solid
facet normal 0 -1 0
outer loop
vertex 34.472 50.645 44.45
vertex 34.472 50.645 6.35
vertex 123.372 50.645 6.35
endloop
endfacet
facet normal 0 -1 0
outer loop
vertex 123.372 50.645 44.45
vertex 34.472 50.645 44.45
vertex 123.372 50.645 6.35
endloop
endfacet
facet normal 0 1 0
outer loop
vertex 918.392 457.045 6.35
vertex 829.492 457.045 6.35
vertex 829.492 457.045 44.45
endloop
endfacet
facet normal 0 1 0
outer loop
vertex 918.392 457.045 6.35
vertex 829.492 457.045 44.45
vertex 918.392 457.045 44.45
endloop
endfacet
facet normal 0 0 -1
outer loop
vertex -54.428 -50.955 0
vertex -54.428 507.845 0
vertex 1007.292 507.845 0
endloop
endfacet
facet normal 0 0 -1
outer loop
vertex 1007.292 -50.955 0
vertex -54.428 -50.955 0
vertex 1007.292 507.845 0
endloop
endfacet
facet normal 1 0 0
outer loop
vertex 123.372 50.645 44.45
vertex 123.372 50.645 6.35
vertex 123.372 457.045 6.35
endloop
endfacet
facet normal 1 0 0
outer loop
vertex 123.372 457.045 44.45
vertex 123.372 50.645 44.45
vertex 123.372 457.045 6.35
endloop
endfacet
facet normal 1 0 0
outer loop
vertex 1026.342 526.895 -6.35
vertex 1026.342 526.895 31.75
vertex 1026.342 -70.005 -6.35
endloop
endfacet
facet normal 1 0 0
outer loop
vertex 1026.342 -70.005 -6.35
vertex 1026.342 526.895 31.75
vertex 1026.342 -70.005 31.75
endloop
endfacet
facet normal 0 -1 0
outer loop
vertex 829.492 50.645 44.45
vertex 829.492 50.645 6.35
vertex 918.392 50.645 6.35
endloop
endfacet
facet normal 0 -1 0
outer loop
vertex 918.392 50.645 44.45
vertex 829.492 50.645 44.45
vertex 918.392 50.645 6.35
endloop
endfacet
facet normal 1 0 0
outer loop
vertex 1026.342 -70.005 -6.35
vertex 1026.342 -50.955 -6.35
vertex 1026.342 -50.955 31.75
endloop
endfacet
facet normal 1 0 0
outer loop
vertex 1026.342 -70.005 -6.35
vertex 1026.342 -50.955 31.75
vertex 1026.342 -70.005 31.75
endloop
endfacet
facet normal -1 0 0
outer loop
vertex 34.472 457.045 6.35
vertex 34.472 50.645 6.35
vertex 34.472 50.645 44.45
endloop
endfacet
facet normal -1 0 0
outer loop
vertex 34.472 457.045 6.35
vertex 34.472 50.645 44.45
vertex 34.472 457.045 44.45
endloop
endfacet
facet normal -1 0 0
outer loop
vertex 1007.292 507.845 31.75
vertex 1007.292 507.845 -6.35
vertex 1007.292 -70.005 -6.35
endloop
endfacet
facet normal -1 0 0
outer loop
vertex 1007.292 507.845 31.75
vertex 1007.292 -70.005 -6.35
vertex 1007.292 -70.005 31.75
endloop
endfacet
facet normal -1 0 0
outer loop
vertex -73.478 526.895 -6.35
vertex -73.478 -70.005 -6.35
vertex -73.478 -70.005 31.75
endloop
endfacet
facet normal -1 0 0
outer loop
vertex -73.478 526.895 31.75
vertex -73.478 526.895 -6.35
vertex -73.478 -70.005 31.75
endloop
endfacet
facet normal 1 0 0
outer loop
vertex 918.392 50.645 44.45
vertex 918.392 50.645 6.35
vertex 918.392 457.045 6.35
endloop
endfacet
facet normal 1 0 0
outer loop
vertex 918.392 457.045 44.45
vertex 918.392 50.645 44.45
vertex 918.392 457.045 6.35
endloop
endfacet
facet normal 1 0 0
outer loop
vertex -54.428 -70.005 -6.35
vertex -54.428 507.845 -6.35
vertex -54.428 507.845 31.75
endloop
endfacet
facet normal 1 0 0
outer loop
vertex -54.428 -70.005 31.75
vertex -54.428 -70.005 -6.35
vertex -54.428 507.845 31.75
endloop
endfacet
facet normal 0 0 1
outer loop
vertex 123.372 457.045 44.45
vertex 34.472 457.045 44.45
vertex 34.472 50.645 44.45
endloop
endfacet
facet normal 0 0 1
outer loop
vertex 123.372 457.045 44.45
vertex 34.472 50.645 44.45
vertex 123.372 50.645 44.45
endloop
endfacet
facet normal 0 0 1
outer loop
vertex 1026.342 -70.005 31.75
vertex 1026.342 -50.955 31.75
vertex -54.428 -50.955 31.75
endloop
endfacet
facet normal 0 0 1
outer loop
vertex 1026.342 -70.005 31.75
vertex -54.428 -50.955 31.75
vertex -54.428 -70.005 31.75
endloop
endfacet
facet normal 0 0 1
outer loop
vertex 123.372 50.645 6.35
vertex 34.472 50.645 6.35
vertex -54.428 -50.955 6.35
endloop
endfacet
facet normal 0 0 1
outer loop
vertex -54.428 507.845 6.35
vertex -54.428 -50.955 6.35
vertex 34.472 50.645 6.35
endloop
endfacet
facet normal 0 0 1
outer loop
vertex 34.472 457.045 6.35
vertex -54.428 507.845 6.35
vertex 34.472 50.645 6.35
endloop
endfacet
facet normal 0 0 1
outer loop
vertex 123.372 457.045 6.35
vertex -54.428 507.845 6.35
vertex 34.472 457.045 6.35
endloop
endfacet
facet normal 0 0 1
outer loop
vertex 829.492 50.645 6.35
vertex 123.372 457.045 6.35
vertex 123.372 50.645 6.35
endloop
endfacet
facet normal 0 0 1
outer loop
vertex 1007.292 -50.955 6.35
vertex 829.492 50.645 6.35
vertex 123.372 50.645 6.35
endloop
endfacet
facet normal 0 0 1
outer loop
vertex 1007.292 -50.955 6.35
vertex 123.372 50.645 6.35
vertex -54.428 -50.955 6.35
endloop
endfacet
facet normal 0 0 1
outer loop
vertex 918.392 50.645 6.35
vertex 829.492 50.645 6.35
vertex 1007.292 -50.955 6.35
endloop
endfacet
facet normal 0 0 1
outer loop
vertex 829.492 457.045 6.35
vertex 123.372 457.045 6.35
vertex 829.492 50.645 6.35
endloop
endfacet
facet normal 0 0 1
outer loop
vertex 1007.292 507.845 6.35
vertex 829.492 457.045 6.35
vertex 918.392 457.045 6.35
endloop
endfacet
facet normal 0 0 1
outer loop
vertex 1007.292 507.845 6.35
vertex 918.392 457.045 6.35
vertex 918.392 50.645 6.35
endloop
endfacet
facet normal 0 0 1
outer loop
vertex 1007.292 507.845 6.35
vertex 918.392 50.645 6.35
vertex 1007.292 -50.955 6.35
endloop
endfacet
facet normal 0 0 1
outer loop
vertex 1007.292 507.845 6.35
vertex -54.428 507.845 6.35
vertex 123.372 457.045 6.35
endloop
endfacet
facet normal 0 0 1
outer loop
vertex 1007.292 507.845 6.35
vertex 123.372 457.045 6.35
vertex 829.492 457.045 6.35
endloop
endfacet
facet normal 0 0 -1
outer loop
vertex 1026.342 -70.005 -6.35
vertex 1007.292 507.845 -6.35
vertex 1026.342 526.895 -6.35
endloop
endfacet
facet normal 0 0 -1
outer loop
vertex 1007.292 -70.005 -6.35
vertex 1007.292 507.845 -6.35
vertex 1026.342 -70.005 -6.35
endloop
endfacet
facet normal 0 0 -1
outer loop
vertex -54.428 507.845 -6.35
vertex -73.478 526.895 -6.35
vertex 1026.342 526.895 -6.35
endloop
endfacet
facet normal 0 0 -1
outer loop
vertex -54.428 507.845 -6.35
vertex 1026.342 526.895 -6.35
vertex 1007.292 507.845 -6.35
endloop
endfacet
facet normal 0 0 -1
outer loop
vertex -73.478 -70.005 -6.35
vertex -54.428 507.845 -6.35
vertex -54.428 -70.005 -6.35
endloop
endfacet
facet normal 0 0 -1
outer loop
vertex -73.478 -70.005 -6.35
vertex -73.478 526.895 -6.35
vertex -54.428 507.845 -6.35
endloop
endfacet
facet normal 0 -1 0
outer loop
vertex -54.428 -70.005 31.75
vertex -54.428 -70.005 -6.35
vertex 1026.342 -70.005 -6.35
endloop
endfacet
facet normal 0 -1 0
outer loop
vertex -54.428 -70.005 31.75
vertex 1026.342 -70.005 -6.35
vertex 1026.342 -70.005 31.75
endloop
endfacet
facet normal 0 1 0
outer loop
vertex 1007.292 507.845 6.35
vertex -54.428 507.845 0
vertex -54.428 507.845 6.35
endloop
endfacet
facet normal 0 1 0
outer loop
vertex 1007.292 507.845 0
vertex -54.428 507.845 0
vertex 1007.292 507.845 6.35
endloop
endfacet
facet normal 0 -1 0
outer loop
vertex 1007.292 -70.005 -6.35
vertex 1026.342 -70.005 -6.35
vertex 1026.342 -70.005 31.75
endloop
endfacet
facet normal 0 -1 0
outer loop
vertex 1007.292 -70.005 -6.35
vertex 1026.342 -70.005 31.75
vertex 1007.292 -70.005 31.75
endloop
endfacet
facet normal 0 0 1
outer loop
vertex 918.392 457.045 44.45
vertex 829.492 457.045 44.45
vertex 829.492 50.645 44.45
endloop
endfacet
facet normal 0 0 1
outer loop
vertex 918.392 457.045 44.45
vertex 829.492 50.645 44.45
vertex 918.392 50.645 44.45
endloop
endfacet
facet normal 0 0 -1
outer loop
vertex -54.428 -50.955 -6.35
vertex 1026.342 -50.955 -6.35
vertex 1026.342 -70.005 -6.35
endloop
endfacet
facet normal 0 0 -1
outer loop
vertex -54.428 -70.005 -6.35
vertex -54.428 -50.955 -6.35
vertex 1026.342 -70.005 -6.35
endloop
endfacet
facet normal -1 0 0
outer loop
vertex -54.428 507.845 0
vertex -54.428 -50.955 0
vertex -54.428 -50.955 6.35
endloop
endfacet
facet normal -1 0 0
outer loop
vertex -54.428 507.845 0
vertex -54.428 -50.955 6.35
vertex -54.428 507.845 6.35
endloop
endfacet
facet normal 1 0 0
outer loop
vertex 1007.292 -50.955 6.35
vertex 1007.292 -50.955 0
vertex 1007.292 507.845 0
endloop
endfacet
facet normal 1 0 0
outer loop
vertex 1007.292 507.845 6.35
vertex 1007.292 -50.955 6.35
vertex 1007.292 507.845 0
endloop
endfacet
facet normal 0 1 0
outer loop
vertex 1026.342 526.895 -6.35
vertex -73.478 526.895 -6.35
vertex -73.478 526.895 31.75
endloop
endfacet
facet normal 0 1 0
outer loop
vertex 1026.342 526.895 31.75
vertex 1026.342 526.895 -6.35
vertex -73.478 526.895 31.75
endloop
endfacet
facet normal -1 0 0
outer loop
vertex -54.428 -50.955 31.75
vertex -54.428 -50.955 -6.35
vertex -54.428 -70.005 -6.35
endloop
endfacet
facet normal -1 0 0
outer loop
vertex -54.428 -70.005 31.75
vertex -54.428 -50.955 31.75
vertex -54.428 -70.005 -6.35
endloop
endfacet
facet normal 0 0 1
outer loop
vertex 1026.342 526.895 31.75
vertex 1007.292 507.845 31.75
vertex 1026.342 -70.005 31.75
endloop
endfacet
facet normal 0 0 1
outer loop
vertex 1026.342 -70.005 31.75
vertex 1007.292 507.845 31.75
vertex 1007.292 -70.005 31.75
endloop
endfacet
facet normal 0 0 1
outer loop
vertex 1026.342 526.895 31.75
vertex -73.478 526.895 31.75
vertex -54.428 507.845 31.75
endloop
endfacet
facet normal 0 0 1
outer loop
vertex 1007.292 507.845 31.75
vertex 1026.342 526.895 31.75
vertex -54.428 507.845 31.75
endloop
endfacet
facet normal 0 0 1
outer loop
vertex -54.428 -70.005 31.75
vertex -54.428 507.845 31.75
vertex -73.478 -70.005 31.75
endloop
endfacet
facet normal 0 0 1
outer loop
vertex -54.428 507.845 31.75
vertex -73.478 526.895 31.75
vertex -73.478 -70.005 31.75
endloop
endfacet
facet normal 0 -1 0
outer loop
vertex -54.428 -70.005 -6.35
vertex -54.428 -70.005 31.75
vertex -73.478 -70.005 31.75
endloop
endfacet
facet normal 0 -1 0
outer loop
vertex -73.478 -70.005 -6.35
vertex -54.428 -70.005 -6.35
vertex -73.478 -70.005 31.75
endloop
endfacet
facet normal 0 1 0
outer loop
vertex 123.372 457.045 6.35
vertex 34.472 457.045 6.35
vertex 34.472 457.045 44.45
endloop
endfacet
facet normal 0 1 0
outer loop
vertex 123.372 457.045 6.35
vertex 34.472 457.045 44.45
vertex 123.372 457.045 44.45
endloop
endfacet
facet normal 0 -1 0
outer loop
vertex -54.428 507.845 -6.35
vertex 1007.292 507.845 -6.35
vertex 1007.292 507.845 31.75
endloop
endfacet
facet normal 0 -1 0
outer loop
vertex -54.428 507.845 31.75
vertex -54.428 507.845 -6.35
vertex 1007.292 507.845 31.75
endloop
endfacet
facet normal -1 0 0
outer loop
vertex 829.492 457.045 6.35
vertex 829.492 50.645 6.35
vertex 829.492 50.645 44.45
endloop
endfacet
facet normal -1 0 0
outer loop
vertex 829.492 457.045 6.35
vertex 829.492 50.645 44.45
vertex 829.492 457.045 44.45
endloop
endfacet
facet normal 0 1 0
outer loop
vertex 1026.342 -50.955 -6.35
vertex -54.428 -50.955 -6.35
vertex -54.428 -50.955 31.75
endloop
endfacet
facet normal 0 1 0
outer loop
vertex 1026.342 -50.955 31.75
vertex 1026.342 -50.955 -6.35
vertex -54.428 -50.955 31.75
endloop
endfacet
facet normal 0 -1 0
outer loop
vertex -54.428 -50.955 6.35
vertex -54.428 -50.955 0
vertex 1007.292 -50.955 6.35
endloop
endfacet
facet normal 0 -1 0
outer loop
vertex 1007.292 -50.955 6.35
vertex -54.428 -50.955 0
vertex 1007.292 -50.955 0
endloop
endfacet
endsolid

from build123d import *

# Parameters (mm, degrees)
F0_W     = 1061.72
F0_H     = 558.8
F1_DEPTH = 6.35
F2_W     = 19.05
F2_H     = 38.1
F3_DEPTH = 1080.77
F4_W     = 19.05
F4_H     = 38.1
F5_DEPTH = 596.9
F6_W     = 88.9
F6_H     = 406.4
F7_DEPTH = 38.1


with BuildPart() as f1:
    # F0 (on Top) → F1 (new body)
    with BuildSketch(Plane.XY):
        with Locations((476.4319329417, 228.4453787148)):
            Rectangle(F0_W, F0_H)
    extrude(amount=F1_DEPTH)

    # F6 (on face) → F7 (join)
    with BuildSketch(Plane.XY.offset(6.35)):
        with Locations((78.9219329417, 253.8453787148)):
            Rectangle(F6_W, F6_H)
        with Locations((873.9419329417, 253.8453787148)):
            Rectangle(F6_W, F6_H)
    extrude(amount=F7_DEPTH)


with BuildPart() as f3:
    # F2 (on face) → F3 (new body)
    with BuildSketch(Plane(origin=(-54.4280670583, 0, 0), x_dir=(0, -1, 0), z_dir=(-1, 0, 0))):
        with Locations((-517.3703787148, 12.7)):
            Rectangle(F2_W, F2_H)
    extrude(amount=-F3_DEPTH)

    # F4 (on face) → F5 (join)
    with BuildSketch(Plane(origin=(0, 526.8953787148, 0), x_dir=(-1, 0, 0), z_dir=(0, 1, 0))):
        with Locations((-1016.8169329417, 12.7)):
            Rectangle(F4_W, F4_H)
        with Locations((63.9530670583, 12.7)):
            Rectangle(F4_W, F4_H)
    extrude(amount=-F5_DEPTH)


with BuildPart() as f3b:
    # F2 (on face) → F3, piece 2 (new body)
    with BuildSketch(Plane(origin=(-54.4280670583, 0, 0), x_dir=(0, -1, 0), z_dir=(-1, 0, 0))):
        with Locations((60.4796212852, 12.7)):
            Rectangle(F2_W, F2_H)
    extrude(amount=-F3_DEPTH)


solid = Compound([f1.part, f3.part, f3b.part])
